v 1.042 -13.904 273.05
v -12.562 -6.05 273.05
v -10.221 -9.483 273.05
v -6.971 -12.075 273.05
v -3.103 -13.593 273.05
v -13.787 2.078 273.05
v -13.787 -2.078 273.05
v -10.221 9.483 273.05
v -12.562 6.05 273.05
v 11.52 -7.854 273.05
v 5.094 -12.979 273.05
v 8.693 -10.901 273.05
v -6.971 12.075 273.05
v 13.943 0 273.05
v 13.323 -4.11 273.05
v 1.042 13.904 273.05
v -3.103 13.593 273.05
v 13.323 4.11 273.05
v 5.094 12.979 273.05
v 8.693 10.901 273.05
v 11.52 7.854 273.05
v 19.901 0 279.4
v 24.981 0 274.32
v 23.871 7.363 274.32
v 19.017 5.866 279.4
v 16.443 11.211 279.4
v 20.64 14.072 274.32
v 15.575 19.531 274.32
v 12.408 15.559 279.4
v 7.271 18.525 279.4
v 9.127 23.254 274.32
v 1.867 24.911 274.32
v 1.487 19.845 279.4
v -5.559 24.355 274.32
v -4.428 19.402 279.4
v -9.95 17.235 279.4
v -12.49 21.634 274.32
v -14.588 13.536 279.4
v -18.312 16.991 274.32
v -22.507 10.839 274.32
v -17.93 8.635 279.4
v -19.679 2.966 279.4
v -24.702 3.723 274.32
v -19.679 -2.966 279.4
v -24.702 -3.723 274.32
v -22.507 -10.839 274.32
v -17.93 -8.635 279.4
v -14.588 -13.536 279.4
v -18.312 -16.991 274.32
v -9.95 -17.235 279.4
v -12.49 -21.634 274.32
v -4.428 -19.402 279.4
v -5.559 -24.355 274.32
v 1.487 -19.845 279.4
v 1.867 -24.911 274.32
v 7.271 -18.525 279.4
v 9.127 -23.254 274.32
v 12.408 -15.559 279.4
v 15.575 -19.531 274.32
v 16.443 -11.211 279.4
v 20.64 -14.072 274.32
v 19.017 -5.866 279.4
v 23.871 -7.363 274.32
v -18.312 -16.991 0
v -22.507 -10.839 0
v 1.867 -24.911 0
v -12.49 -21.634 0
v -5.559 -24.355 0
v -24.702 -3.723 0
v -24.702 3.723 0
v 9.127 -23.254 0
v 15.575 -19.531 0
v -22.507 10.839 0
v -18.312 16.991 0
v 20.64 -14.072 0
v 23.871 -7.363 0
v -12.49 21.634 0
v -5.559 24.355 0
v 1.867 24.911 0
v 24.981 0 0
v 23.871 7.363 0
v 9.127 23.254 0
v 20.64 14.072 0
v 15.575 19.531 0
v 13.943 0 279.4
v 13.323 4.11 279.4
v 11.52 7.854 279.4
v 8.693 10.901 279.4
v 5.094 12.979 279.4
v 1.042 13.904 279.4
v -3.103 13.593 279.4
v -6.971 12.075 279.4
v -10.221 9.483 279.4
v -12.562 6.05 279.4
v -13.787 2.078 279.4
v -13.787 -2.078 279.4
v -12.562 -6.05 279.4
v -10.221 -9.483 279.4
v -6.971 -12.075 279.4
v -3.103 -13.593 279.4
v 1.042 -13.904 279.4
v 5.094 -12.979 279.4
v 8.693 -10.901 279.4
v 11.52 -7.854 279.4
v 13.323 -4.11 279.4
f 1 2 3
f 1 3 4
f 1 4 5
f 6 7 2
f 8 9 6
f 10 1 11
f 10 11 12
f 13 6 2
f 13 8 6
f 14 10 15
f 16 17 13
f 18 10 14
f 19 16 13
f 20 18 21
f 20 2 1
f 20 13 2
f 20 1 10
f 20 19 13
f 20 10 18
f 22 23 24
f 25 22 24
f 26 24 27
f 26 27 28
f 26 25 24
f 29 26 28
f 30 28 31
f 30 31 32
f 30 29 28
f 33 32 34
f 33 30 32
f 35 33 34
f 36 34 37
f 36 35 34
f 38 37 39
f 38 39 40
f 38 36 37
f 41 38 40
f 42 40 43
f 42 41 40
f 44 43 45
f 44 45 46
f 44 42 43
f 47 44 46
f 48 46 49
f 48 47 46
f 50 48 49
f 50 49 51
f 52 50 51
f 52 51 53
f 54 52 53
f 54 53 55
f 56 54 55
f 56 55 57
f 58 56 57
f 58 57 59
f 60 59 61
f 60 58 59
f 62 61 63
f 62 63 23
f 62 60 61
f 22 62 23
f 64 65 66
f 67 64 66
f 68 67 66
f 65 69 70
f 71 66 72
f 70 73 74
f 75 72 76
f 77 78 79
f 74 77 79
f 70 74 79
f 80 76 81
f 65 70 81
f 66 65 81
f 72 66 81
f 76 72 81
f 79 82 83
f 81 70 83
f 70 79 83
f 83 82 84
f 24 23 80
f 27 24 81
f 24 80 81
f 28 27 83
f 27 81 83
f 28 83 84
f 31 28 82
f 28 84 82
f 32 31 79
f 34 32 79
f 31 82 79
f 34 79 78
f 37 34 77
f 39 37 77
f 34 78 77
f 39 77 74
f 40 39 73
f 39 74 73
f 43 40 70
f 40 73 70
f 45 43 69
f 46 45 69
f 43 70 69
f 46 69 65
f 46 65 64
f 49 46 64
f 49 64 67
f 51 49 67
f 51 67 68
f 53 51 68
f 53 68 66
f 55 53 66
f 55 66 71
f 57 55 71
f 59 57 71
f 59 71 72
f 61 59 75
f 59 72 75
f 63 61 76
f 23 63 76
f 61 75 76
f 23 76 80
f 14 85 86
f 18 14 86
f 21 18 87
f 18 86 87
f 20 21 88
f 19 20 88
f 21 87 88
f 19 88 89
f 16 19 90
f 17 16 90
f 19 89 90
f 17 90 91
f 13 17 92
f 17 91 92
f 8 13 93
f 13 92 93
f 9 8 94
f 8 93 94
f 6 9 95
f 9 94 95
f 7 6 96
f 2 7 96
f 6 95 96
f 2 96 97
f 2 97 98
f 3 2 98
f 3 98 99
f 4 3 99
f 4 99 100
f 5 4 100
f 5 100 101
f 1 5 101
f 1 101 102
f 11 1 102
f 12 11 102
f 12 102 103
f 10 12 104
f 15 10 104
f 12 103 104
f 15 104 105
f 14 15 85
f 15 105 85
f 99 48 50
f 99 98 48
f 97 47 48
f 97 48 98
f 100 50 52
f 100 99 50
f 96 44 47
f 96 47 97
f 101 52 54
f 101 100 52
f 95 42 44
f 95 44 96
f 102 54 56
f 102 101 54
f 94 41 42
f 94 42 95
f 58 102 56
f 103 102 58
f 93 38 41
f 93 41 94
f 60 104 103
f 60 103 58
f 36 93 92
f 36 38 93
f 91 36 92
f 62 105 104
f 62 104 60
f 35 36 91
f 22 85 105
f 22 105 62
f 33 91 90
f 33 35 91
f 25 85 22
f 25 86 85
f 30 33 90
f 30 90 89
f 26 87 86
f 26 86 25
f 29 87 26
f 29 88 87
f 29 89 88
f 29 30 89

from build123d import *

# Parameters (mm, degrees)
F0_R     = 24.9809
F1_DEPTH = 279.4
F2_SIZE  = 5.08
F3_R     = 13.942679
F4_DEPTH = 6.35


with BuildPart() as f1:
    # F0 (on Top) → F1 (new body)
    with BuildSketch(Plane.XY):
        Circle(F0_R)
    extrude(amount=F1_DEPTH)

    # F2
    f2_edges = [f1.edges().sort_by_distance(p)[0] for p in [
        (-24.9809, 0, 279.4),
    ]]
    chamfer(f2_edges, length=F2_SIZE)

    # F3 (on face) → F4 (cut)
    with BuildSketch(Plane.XY.offset(279.4)):
        Circle(F3_R)
    extrude(amount=-F4_DEPTH, mode=Mode.SUBTRACT)


solid = f1.part
